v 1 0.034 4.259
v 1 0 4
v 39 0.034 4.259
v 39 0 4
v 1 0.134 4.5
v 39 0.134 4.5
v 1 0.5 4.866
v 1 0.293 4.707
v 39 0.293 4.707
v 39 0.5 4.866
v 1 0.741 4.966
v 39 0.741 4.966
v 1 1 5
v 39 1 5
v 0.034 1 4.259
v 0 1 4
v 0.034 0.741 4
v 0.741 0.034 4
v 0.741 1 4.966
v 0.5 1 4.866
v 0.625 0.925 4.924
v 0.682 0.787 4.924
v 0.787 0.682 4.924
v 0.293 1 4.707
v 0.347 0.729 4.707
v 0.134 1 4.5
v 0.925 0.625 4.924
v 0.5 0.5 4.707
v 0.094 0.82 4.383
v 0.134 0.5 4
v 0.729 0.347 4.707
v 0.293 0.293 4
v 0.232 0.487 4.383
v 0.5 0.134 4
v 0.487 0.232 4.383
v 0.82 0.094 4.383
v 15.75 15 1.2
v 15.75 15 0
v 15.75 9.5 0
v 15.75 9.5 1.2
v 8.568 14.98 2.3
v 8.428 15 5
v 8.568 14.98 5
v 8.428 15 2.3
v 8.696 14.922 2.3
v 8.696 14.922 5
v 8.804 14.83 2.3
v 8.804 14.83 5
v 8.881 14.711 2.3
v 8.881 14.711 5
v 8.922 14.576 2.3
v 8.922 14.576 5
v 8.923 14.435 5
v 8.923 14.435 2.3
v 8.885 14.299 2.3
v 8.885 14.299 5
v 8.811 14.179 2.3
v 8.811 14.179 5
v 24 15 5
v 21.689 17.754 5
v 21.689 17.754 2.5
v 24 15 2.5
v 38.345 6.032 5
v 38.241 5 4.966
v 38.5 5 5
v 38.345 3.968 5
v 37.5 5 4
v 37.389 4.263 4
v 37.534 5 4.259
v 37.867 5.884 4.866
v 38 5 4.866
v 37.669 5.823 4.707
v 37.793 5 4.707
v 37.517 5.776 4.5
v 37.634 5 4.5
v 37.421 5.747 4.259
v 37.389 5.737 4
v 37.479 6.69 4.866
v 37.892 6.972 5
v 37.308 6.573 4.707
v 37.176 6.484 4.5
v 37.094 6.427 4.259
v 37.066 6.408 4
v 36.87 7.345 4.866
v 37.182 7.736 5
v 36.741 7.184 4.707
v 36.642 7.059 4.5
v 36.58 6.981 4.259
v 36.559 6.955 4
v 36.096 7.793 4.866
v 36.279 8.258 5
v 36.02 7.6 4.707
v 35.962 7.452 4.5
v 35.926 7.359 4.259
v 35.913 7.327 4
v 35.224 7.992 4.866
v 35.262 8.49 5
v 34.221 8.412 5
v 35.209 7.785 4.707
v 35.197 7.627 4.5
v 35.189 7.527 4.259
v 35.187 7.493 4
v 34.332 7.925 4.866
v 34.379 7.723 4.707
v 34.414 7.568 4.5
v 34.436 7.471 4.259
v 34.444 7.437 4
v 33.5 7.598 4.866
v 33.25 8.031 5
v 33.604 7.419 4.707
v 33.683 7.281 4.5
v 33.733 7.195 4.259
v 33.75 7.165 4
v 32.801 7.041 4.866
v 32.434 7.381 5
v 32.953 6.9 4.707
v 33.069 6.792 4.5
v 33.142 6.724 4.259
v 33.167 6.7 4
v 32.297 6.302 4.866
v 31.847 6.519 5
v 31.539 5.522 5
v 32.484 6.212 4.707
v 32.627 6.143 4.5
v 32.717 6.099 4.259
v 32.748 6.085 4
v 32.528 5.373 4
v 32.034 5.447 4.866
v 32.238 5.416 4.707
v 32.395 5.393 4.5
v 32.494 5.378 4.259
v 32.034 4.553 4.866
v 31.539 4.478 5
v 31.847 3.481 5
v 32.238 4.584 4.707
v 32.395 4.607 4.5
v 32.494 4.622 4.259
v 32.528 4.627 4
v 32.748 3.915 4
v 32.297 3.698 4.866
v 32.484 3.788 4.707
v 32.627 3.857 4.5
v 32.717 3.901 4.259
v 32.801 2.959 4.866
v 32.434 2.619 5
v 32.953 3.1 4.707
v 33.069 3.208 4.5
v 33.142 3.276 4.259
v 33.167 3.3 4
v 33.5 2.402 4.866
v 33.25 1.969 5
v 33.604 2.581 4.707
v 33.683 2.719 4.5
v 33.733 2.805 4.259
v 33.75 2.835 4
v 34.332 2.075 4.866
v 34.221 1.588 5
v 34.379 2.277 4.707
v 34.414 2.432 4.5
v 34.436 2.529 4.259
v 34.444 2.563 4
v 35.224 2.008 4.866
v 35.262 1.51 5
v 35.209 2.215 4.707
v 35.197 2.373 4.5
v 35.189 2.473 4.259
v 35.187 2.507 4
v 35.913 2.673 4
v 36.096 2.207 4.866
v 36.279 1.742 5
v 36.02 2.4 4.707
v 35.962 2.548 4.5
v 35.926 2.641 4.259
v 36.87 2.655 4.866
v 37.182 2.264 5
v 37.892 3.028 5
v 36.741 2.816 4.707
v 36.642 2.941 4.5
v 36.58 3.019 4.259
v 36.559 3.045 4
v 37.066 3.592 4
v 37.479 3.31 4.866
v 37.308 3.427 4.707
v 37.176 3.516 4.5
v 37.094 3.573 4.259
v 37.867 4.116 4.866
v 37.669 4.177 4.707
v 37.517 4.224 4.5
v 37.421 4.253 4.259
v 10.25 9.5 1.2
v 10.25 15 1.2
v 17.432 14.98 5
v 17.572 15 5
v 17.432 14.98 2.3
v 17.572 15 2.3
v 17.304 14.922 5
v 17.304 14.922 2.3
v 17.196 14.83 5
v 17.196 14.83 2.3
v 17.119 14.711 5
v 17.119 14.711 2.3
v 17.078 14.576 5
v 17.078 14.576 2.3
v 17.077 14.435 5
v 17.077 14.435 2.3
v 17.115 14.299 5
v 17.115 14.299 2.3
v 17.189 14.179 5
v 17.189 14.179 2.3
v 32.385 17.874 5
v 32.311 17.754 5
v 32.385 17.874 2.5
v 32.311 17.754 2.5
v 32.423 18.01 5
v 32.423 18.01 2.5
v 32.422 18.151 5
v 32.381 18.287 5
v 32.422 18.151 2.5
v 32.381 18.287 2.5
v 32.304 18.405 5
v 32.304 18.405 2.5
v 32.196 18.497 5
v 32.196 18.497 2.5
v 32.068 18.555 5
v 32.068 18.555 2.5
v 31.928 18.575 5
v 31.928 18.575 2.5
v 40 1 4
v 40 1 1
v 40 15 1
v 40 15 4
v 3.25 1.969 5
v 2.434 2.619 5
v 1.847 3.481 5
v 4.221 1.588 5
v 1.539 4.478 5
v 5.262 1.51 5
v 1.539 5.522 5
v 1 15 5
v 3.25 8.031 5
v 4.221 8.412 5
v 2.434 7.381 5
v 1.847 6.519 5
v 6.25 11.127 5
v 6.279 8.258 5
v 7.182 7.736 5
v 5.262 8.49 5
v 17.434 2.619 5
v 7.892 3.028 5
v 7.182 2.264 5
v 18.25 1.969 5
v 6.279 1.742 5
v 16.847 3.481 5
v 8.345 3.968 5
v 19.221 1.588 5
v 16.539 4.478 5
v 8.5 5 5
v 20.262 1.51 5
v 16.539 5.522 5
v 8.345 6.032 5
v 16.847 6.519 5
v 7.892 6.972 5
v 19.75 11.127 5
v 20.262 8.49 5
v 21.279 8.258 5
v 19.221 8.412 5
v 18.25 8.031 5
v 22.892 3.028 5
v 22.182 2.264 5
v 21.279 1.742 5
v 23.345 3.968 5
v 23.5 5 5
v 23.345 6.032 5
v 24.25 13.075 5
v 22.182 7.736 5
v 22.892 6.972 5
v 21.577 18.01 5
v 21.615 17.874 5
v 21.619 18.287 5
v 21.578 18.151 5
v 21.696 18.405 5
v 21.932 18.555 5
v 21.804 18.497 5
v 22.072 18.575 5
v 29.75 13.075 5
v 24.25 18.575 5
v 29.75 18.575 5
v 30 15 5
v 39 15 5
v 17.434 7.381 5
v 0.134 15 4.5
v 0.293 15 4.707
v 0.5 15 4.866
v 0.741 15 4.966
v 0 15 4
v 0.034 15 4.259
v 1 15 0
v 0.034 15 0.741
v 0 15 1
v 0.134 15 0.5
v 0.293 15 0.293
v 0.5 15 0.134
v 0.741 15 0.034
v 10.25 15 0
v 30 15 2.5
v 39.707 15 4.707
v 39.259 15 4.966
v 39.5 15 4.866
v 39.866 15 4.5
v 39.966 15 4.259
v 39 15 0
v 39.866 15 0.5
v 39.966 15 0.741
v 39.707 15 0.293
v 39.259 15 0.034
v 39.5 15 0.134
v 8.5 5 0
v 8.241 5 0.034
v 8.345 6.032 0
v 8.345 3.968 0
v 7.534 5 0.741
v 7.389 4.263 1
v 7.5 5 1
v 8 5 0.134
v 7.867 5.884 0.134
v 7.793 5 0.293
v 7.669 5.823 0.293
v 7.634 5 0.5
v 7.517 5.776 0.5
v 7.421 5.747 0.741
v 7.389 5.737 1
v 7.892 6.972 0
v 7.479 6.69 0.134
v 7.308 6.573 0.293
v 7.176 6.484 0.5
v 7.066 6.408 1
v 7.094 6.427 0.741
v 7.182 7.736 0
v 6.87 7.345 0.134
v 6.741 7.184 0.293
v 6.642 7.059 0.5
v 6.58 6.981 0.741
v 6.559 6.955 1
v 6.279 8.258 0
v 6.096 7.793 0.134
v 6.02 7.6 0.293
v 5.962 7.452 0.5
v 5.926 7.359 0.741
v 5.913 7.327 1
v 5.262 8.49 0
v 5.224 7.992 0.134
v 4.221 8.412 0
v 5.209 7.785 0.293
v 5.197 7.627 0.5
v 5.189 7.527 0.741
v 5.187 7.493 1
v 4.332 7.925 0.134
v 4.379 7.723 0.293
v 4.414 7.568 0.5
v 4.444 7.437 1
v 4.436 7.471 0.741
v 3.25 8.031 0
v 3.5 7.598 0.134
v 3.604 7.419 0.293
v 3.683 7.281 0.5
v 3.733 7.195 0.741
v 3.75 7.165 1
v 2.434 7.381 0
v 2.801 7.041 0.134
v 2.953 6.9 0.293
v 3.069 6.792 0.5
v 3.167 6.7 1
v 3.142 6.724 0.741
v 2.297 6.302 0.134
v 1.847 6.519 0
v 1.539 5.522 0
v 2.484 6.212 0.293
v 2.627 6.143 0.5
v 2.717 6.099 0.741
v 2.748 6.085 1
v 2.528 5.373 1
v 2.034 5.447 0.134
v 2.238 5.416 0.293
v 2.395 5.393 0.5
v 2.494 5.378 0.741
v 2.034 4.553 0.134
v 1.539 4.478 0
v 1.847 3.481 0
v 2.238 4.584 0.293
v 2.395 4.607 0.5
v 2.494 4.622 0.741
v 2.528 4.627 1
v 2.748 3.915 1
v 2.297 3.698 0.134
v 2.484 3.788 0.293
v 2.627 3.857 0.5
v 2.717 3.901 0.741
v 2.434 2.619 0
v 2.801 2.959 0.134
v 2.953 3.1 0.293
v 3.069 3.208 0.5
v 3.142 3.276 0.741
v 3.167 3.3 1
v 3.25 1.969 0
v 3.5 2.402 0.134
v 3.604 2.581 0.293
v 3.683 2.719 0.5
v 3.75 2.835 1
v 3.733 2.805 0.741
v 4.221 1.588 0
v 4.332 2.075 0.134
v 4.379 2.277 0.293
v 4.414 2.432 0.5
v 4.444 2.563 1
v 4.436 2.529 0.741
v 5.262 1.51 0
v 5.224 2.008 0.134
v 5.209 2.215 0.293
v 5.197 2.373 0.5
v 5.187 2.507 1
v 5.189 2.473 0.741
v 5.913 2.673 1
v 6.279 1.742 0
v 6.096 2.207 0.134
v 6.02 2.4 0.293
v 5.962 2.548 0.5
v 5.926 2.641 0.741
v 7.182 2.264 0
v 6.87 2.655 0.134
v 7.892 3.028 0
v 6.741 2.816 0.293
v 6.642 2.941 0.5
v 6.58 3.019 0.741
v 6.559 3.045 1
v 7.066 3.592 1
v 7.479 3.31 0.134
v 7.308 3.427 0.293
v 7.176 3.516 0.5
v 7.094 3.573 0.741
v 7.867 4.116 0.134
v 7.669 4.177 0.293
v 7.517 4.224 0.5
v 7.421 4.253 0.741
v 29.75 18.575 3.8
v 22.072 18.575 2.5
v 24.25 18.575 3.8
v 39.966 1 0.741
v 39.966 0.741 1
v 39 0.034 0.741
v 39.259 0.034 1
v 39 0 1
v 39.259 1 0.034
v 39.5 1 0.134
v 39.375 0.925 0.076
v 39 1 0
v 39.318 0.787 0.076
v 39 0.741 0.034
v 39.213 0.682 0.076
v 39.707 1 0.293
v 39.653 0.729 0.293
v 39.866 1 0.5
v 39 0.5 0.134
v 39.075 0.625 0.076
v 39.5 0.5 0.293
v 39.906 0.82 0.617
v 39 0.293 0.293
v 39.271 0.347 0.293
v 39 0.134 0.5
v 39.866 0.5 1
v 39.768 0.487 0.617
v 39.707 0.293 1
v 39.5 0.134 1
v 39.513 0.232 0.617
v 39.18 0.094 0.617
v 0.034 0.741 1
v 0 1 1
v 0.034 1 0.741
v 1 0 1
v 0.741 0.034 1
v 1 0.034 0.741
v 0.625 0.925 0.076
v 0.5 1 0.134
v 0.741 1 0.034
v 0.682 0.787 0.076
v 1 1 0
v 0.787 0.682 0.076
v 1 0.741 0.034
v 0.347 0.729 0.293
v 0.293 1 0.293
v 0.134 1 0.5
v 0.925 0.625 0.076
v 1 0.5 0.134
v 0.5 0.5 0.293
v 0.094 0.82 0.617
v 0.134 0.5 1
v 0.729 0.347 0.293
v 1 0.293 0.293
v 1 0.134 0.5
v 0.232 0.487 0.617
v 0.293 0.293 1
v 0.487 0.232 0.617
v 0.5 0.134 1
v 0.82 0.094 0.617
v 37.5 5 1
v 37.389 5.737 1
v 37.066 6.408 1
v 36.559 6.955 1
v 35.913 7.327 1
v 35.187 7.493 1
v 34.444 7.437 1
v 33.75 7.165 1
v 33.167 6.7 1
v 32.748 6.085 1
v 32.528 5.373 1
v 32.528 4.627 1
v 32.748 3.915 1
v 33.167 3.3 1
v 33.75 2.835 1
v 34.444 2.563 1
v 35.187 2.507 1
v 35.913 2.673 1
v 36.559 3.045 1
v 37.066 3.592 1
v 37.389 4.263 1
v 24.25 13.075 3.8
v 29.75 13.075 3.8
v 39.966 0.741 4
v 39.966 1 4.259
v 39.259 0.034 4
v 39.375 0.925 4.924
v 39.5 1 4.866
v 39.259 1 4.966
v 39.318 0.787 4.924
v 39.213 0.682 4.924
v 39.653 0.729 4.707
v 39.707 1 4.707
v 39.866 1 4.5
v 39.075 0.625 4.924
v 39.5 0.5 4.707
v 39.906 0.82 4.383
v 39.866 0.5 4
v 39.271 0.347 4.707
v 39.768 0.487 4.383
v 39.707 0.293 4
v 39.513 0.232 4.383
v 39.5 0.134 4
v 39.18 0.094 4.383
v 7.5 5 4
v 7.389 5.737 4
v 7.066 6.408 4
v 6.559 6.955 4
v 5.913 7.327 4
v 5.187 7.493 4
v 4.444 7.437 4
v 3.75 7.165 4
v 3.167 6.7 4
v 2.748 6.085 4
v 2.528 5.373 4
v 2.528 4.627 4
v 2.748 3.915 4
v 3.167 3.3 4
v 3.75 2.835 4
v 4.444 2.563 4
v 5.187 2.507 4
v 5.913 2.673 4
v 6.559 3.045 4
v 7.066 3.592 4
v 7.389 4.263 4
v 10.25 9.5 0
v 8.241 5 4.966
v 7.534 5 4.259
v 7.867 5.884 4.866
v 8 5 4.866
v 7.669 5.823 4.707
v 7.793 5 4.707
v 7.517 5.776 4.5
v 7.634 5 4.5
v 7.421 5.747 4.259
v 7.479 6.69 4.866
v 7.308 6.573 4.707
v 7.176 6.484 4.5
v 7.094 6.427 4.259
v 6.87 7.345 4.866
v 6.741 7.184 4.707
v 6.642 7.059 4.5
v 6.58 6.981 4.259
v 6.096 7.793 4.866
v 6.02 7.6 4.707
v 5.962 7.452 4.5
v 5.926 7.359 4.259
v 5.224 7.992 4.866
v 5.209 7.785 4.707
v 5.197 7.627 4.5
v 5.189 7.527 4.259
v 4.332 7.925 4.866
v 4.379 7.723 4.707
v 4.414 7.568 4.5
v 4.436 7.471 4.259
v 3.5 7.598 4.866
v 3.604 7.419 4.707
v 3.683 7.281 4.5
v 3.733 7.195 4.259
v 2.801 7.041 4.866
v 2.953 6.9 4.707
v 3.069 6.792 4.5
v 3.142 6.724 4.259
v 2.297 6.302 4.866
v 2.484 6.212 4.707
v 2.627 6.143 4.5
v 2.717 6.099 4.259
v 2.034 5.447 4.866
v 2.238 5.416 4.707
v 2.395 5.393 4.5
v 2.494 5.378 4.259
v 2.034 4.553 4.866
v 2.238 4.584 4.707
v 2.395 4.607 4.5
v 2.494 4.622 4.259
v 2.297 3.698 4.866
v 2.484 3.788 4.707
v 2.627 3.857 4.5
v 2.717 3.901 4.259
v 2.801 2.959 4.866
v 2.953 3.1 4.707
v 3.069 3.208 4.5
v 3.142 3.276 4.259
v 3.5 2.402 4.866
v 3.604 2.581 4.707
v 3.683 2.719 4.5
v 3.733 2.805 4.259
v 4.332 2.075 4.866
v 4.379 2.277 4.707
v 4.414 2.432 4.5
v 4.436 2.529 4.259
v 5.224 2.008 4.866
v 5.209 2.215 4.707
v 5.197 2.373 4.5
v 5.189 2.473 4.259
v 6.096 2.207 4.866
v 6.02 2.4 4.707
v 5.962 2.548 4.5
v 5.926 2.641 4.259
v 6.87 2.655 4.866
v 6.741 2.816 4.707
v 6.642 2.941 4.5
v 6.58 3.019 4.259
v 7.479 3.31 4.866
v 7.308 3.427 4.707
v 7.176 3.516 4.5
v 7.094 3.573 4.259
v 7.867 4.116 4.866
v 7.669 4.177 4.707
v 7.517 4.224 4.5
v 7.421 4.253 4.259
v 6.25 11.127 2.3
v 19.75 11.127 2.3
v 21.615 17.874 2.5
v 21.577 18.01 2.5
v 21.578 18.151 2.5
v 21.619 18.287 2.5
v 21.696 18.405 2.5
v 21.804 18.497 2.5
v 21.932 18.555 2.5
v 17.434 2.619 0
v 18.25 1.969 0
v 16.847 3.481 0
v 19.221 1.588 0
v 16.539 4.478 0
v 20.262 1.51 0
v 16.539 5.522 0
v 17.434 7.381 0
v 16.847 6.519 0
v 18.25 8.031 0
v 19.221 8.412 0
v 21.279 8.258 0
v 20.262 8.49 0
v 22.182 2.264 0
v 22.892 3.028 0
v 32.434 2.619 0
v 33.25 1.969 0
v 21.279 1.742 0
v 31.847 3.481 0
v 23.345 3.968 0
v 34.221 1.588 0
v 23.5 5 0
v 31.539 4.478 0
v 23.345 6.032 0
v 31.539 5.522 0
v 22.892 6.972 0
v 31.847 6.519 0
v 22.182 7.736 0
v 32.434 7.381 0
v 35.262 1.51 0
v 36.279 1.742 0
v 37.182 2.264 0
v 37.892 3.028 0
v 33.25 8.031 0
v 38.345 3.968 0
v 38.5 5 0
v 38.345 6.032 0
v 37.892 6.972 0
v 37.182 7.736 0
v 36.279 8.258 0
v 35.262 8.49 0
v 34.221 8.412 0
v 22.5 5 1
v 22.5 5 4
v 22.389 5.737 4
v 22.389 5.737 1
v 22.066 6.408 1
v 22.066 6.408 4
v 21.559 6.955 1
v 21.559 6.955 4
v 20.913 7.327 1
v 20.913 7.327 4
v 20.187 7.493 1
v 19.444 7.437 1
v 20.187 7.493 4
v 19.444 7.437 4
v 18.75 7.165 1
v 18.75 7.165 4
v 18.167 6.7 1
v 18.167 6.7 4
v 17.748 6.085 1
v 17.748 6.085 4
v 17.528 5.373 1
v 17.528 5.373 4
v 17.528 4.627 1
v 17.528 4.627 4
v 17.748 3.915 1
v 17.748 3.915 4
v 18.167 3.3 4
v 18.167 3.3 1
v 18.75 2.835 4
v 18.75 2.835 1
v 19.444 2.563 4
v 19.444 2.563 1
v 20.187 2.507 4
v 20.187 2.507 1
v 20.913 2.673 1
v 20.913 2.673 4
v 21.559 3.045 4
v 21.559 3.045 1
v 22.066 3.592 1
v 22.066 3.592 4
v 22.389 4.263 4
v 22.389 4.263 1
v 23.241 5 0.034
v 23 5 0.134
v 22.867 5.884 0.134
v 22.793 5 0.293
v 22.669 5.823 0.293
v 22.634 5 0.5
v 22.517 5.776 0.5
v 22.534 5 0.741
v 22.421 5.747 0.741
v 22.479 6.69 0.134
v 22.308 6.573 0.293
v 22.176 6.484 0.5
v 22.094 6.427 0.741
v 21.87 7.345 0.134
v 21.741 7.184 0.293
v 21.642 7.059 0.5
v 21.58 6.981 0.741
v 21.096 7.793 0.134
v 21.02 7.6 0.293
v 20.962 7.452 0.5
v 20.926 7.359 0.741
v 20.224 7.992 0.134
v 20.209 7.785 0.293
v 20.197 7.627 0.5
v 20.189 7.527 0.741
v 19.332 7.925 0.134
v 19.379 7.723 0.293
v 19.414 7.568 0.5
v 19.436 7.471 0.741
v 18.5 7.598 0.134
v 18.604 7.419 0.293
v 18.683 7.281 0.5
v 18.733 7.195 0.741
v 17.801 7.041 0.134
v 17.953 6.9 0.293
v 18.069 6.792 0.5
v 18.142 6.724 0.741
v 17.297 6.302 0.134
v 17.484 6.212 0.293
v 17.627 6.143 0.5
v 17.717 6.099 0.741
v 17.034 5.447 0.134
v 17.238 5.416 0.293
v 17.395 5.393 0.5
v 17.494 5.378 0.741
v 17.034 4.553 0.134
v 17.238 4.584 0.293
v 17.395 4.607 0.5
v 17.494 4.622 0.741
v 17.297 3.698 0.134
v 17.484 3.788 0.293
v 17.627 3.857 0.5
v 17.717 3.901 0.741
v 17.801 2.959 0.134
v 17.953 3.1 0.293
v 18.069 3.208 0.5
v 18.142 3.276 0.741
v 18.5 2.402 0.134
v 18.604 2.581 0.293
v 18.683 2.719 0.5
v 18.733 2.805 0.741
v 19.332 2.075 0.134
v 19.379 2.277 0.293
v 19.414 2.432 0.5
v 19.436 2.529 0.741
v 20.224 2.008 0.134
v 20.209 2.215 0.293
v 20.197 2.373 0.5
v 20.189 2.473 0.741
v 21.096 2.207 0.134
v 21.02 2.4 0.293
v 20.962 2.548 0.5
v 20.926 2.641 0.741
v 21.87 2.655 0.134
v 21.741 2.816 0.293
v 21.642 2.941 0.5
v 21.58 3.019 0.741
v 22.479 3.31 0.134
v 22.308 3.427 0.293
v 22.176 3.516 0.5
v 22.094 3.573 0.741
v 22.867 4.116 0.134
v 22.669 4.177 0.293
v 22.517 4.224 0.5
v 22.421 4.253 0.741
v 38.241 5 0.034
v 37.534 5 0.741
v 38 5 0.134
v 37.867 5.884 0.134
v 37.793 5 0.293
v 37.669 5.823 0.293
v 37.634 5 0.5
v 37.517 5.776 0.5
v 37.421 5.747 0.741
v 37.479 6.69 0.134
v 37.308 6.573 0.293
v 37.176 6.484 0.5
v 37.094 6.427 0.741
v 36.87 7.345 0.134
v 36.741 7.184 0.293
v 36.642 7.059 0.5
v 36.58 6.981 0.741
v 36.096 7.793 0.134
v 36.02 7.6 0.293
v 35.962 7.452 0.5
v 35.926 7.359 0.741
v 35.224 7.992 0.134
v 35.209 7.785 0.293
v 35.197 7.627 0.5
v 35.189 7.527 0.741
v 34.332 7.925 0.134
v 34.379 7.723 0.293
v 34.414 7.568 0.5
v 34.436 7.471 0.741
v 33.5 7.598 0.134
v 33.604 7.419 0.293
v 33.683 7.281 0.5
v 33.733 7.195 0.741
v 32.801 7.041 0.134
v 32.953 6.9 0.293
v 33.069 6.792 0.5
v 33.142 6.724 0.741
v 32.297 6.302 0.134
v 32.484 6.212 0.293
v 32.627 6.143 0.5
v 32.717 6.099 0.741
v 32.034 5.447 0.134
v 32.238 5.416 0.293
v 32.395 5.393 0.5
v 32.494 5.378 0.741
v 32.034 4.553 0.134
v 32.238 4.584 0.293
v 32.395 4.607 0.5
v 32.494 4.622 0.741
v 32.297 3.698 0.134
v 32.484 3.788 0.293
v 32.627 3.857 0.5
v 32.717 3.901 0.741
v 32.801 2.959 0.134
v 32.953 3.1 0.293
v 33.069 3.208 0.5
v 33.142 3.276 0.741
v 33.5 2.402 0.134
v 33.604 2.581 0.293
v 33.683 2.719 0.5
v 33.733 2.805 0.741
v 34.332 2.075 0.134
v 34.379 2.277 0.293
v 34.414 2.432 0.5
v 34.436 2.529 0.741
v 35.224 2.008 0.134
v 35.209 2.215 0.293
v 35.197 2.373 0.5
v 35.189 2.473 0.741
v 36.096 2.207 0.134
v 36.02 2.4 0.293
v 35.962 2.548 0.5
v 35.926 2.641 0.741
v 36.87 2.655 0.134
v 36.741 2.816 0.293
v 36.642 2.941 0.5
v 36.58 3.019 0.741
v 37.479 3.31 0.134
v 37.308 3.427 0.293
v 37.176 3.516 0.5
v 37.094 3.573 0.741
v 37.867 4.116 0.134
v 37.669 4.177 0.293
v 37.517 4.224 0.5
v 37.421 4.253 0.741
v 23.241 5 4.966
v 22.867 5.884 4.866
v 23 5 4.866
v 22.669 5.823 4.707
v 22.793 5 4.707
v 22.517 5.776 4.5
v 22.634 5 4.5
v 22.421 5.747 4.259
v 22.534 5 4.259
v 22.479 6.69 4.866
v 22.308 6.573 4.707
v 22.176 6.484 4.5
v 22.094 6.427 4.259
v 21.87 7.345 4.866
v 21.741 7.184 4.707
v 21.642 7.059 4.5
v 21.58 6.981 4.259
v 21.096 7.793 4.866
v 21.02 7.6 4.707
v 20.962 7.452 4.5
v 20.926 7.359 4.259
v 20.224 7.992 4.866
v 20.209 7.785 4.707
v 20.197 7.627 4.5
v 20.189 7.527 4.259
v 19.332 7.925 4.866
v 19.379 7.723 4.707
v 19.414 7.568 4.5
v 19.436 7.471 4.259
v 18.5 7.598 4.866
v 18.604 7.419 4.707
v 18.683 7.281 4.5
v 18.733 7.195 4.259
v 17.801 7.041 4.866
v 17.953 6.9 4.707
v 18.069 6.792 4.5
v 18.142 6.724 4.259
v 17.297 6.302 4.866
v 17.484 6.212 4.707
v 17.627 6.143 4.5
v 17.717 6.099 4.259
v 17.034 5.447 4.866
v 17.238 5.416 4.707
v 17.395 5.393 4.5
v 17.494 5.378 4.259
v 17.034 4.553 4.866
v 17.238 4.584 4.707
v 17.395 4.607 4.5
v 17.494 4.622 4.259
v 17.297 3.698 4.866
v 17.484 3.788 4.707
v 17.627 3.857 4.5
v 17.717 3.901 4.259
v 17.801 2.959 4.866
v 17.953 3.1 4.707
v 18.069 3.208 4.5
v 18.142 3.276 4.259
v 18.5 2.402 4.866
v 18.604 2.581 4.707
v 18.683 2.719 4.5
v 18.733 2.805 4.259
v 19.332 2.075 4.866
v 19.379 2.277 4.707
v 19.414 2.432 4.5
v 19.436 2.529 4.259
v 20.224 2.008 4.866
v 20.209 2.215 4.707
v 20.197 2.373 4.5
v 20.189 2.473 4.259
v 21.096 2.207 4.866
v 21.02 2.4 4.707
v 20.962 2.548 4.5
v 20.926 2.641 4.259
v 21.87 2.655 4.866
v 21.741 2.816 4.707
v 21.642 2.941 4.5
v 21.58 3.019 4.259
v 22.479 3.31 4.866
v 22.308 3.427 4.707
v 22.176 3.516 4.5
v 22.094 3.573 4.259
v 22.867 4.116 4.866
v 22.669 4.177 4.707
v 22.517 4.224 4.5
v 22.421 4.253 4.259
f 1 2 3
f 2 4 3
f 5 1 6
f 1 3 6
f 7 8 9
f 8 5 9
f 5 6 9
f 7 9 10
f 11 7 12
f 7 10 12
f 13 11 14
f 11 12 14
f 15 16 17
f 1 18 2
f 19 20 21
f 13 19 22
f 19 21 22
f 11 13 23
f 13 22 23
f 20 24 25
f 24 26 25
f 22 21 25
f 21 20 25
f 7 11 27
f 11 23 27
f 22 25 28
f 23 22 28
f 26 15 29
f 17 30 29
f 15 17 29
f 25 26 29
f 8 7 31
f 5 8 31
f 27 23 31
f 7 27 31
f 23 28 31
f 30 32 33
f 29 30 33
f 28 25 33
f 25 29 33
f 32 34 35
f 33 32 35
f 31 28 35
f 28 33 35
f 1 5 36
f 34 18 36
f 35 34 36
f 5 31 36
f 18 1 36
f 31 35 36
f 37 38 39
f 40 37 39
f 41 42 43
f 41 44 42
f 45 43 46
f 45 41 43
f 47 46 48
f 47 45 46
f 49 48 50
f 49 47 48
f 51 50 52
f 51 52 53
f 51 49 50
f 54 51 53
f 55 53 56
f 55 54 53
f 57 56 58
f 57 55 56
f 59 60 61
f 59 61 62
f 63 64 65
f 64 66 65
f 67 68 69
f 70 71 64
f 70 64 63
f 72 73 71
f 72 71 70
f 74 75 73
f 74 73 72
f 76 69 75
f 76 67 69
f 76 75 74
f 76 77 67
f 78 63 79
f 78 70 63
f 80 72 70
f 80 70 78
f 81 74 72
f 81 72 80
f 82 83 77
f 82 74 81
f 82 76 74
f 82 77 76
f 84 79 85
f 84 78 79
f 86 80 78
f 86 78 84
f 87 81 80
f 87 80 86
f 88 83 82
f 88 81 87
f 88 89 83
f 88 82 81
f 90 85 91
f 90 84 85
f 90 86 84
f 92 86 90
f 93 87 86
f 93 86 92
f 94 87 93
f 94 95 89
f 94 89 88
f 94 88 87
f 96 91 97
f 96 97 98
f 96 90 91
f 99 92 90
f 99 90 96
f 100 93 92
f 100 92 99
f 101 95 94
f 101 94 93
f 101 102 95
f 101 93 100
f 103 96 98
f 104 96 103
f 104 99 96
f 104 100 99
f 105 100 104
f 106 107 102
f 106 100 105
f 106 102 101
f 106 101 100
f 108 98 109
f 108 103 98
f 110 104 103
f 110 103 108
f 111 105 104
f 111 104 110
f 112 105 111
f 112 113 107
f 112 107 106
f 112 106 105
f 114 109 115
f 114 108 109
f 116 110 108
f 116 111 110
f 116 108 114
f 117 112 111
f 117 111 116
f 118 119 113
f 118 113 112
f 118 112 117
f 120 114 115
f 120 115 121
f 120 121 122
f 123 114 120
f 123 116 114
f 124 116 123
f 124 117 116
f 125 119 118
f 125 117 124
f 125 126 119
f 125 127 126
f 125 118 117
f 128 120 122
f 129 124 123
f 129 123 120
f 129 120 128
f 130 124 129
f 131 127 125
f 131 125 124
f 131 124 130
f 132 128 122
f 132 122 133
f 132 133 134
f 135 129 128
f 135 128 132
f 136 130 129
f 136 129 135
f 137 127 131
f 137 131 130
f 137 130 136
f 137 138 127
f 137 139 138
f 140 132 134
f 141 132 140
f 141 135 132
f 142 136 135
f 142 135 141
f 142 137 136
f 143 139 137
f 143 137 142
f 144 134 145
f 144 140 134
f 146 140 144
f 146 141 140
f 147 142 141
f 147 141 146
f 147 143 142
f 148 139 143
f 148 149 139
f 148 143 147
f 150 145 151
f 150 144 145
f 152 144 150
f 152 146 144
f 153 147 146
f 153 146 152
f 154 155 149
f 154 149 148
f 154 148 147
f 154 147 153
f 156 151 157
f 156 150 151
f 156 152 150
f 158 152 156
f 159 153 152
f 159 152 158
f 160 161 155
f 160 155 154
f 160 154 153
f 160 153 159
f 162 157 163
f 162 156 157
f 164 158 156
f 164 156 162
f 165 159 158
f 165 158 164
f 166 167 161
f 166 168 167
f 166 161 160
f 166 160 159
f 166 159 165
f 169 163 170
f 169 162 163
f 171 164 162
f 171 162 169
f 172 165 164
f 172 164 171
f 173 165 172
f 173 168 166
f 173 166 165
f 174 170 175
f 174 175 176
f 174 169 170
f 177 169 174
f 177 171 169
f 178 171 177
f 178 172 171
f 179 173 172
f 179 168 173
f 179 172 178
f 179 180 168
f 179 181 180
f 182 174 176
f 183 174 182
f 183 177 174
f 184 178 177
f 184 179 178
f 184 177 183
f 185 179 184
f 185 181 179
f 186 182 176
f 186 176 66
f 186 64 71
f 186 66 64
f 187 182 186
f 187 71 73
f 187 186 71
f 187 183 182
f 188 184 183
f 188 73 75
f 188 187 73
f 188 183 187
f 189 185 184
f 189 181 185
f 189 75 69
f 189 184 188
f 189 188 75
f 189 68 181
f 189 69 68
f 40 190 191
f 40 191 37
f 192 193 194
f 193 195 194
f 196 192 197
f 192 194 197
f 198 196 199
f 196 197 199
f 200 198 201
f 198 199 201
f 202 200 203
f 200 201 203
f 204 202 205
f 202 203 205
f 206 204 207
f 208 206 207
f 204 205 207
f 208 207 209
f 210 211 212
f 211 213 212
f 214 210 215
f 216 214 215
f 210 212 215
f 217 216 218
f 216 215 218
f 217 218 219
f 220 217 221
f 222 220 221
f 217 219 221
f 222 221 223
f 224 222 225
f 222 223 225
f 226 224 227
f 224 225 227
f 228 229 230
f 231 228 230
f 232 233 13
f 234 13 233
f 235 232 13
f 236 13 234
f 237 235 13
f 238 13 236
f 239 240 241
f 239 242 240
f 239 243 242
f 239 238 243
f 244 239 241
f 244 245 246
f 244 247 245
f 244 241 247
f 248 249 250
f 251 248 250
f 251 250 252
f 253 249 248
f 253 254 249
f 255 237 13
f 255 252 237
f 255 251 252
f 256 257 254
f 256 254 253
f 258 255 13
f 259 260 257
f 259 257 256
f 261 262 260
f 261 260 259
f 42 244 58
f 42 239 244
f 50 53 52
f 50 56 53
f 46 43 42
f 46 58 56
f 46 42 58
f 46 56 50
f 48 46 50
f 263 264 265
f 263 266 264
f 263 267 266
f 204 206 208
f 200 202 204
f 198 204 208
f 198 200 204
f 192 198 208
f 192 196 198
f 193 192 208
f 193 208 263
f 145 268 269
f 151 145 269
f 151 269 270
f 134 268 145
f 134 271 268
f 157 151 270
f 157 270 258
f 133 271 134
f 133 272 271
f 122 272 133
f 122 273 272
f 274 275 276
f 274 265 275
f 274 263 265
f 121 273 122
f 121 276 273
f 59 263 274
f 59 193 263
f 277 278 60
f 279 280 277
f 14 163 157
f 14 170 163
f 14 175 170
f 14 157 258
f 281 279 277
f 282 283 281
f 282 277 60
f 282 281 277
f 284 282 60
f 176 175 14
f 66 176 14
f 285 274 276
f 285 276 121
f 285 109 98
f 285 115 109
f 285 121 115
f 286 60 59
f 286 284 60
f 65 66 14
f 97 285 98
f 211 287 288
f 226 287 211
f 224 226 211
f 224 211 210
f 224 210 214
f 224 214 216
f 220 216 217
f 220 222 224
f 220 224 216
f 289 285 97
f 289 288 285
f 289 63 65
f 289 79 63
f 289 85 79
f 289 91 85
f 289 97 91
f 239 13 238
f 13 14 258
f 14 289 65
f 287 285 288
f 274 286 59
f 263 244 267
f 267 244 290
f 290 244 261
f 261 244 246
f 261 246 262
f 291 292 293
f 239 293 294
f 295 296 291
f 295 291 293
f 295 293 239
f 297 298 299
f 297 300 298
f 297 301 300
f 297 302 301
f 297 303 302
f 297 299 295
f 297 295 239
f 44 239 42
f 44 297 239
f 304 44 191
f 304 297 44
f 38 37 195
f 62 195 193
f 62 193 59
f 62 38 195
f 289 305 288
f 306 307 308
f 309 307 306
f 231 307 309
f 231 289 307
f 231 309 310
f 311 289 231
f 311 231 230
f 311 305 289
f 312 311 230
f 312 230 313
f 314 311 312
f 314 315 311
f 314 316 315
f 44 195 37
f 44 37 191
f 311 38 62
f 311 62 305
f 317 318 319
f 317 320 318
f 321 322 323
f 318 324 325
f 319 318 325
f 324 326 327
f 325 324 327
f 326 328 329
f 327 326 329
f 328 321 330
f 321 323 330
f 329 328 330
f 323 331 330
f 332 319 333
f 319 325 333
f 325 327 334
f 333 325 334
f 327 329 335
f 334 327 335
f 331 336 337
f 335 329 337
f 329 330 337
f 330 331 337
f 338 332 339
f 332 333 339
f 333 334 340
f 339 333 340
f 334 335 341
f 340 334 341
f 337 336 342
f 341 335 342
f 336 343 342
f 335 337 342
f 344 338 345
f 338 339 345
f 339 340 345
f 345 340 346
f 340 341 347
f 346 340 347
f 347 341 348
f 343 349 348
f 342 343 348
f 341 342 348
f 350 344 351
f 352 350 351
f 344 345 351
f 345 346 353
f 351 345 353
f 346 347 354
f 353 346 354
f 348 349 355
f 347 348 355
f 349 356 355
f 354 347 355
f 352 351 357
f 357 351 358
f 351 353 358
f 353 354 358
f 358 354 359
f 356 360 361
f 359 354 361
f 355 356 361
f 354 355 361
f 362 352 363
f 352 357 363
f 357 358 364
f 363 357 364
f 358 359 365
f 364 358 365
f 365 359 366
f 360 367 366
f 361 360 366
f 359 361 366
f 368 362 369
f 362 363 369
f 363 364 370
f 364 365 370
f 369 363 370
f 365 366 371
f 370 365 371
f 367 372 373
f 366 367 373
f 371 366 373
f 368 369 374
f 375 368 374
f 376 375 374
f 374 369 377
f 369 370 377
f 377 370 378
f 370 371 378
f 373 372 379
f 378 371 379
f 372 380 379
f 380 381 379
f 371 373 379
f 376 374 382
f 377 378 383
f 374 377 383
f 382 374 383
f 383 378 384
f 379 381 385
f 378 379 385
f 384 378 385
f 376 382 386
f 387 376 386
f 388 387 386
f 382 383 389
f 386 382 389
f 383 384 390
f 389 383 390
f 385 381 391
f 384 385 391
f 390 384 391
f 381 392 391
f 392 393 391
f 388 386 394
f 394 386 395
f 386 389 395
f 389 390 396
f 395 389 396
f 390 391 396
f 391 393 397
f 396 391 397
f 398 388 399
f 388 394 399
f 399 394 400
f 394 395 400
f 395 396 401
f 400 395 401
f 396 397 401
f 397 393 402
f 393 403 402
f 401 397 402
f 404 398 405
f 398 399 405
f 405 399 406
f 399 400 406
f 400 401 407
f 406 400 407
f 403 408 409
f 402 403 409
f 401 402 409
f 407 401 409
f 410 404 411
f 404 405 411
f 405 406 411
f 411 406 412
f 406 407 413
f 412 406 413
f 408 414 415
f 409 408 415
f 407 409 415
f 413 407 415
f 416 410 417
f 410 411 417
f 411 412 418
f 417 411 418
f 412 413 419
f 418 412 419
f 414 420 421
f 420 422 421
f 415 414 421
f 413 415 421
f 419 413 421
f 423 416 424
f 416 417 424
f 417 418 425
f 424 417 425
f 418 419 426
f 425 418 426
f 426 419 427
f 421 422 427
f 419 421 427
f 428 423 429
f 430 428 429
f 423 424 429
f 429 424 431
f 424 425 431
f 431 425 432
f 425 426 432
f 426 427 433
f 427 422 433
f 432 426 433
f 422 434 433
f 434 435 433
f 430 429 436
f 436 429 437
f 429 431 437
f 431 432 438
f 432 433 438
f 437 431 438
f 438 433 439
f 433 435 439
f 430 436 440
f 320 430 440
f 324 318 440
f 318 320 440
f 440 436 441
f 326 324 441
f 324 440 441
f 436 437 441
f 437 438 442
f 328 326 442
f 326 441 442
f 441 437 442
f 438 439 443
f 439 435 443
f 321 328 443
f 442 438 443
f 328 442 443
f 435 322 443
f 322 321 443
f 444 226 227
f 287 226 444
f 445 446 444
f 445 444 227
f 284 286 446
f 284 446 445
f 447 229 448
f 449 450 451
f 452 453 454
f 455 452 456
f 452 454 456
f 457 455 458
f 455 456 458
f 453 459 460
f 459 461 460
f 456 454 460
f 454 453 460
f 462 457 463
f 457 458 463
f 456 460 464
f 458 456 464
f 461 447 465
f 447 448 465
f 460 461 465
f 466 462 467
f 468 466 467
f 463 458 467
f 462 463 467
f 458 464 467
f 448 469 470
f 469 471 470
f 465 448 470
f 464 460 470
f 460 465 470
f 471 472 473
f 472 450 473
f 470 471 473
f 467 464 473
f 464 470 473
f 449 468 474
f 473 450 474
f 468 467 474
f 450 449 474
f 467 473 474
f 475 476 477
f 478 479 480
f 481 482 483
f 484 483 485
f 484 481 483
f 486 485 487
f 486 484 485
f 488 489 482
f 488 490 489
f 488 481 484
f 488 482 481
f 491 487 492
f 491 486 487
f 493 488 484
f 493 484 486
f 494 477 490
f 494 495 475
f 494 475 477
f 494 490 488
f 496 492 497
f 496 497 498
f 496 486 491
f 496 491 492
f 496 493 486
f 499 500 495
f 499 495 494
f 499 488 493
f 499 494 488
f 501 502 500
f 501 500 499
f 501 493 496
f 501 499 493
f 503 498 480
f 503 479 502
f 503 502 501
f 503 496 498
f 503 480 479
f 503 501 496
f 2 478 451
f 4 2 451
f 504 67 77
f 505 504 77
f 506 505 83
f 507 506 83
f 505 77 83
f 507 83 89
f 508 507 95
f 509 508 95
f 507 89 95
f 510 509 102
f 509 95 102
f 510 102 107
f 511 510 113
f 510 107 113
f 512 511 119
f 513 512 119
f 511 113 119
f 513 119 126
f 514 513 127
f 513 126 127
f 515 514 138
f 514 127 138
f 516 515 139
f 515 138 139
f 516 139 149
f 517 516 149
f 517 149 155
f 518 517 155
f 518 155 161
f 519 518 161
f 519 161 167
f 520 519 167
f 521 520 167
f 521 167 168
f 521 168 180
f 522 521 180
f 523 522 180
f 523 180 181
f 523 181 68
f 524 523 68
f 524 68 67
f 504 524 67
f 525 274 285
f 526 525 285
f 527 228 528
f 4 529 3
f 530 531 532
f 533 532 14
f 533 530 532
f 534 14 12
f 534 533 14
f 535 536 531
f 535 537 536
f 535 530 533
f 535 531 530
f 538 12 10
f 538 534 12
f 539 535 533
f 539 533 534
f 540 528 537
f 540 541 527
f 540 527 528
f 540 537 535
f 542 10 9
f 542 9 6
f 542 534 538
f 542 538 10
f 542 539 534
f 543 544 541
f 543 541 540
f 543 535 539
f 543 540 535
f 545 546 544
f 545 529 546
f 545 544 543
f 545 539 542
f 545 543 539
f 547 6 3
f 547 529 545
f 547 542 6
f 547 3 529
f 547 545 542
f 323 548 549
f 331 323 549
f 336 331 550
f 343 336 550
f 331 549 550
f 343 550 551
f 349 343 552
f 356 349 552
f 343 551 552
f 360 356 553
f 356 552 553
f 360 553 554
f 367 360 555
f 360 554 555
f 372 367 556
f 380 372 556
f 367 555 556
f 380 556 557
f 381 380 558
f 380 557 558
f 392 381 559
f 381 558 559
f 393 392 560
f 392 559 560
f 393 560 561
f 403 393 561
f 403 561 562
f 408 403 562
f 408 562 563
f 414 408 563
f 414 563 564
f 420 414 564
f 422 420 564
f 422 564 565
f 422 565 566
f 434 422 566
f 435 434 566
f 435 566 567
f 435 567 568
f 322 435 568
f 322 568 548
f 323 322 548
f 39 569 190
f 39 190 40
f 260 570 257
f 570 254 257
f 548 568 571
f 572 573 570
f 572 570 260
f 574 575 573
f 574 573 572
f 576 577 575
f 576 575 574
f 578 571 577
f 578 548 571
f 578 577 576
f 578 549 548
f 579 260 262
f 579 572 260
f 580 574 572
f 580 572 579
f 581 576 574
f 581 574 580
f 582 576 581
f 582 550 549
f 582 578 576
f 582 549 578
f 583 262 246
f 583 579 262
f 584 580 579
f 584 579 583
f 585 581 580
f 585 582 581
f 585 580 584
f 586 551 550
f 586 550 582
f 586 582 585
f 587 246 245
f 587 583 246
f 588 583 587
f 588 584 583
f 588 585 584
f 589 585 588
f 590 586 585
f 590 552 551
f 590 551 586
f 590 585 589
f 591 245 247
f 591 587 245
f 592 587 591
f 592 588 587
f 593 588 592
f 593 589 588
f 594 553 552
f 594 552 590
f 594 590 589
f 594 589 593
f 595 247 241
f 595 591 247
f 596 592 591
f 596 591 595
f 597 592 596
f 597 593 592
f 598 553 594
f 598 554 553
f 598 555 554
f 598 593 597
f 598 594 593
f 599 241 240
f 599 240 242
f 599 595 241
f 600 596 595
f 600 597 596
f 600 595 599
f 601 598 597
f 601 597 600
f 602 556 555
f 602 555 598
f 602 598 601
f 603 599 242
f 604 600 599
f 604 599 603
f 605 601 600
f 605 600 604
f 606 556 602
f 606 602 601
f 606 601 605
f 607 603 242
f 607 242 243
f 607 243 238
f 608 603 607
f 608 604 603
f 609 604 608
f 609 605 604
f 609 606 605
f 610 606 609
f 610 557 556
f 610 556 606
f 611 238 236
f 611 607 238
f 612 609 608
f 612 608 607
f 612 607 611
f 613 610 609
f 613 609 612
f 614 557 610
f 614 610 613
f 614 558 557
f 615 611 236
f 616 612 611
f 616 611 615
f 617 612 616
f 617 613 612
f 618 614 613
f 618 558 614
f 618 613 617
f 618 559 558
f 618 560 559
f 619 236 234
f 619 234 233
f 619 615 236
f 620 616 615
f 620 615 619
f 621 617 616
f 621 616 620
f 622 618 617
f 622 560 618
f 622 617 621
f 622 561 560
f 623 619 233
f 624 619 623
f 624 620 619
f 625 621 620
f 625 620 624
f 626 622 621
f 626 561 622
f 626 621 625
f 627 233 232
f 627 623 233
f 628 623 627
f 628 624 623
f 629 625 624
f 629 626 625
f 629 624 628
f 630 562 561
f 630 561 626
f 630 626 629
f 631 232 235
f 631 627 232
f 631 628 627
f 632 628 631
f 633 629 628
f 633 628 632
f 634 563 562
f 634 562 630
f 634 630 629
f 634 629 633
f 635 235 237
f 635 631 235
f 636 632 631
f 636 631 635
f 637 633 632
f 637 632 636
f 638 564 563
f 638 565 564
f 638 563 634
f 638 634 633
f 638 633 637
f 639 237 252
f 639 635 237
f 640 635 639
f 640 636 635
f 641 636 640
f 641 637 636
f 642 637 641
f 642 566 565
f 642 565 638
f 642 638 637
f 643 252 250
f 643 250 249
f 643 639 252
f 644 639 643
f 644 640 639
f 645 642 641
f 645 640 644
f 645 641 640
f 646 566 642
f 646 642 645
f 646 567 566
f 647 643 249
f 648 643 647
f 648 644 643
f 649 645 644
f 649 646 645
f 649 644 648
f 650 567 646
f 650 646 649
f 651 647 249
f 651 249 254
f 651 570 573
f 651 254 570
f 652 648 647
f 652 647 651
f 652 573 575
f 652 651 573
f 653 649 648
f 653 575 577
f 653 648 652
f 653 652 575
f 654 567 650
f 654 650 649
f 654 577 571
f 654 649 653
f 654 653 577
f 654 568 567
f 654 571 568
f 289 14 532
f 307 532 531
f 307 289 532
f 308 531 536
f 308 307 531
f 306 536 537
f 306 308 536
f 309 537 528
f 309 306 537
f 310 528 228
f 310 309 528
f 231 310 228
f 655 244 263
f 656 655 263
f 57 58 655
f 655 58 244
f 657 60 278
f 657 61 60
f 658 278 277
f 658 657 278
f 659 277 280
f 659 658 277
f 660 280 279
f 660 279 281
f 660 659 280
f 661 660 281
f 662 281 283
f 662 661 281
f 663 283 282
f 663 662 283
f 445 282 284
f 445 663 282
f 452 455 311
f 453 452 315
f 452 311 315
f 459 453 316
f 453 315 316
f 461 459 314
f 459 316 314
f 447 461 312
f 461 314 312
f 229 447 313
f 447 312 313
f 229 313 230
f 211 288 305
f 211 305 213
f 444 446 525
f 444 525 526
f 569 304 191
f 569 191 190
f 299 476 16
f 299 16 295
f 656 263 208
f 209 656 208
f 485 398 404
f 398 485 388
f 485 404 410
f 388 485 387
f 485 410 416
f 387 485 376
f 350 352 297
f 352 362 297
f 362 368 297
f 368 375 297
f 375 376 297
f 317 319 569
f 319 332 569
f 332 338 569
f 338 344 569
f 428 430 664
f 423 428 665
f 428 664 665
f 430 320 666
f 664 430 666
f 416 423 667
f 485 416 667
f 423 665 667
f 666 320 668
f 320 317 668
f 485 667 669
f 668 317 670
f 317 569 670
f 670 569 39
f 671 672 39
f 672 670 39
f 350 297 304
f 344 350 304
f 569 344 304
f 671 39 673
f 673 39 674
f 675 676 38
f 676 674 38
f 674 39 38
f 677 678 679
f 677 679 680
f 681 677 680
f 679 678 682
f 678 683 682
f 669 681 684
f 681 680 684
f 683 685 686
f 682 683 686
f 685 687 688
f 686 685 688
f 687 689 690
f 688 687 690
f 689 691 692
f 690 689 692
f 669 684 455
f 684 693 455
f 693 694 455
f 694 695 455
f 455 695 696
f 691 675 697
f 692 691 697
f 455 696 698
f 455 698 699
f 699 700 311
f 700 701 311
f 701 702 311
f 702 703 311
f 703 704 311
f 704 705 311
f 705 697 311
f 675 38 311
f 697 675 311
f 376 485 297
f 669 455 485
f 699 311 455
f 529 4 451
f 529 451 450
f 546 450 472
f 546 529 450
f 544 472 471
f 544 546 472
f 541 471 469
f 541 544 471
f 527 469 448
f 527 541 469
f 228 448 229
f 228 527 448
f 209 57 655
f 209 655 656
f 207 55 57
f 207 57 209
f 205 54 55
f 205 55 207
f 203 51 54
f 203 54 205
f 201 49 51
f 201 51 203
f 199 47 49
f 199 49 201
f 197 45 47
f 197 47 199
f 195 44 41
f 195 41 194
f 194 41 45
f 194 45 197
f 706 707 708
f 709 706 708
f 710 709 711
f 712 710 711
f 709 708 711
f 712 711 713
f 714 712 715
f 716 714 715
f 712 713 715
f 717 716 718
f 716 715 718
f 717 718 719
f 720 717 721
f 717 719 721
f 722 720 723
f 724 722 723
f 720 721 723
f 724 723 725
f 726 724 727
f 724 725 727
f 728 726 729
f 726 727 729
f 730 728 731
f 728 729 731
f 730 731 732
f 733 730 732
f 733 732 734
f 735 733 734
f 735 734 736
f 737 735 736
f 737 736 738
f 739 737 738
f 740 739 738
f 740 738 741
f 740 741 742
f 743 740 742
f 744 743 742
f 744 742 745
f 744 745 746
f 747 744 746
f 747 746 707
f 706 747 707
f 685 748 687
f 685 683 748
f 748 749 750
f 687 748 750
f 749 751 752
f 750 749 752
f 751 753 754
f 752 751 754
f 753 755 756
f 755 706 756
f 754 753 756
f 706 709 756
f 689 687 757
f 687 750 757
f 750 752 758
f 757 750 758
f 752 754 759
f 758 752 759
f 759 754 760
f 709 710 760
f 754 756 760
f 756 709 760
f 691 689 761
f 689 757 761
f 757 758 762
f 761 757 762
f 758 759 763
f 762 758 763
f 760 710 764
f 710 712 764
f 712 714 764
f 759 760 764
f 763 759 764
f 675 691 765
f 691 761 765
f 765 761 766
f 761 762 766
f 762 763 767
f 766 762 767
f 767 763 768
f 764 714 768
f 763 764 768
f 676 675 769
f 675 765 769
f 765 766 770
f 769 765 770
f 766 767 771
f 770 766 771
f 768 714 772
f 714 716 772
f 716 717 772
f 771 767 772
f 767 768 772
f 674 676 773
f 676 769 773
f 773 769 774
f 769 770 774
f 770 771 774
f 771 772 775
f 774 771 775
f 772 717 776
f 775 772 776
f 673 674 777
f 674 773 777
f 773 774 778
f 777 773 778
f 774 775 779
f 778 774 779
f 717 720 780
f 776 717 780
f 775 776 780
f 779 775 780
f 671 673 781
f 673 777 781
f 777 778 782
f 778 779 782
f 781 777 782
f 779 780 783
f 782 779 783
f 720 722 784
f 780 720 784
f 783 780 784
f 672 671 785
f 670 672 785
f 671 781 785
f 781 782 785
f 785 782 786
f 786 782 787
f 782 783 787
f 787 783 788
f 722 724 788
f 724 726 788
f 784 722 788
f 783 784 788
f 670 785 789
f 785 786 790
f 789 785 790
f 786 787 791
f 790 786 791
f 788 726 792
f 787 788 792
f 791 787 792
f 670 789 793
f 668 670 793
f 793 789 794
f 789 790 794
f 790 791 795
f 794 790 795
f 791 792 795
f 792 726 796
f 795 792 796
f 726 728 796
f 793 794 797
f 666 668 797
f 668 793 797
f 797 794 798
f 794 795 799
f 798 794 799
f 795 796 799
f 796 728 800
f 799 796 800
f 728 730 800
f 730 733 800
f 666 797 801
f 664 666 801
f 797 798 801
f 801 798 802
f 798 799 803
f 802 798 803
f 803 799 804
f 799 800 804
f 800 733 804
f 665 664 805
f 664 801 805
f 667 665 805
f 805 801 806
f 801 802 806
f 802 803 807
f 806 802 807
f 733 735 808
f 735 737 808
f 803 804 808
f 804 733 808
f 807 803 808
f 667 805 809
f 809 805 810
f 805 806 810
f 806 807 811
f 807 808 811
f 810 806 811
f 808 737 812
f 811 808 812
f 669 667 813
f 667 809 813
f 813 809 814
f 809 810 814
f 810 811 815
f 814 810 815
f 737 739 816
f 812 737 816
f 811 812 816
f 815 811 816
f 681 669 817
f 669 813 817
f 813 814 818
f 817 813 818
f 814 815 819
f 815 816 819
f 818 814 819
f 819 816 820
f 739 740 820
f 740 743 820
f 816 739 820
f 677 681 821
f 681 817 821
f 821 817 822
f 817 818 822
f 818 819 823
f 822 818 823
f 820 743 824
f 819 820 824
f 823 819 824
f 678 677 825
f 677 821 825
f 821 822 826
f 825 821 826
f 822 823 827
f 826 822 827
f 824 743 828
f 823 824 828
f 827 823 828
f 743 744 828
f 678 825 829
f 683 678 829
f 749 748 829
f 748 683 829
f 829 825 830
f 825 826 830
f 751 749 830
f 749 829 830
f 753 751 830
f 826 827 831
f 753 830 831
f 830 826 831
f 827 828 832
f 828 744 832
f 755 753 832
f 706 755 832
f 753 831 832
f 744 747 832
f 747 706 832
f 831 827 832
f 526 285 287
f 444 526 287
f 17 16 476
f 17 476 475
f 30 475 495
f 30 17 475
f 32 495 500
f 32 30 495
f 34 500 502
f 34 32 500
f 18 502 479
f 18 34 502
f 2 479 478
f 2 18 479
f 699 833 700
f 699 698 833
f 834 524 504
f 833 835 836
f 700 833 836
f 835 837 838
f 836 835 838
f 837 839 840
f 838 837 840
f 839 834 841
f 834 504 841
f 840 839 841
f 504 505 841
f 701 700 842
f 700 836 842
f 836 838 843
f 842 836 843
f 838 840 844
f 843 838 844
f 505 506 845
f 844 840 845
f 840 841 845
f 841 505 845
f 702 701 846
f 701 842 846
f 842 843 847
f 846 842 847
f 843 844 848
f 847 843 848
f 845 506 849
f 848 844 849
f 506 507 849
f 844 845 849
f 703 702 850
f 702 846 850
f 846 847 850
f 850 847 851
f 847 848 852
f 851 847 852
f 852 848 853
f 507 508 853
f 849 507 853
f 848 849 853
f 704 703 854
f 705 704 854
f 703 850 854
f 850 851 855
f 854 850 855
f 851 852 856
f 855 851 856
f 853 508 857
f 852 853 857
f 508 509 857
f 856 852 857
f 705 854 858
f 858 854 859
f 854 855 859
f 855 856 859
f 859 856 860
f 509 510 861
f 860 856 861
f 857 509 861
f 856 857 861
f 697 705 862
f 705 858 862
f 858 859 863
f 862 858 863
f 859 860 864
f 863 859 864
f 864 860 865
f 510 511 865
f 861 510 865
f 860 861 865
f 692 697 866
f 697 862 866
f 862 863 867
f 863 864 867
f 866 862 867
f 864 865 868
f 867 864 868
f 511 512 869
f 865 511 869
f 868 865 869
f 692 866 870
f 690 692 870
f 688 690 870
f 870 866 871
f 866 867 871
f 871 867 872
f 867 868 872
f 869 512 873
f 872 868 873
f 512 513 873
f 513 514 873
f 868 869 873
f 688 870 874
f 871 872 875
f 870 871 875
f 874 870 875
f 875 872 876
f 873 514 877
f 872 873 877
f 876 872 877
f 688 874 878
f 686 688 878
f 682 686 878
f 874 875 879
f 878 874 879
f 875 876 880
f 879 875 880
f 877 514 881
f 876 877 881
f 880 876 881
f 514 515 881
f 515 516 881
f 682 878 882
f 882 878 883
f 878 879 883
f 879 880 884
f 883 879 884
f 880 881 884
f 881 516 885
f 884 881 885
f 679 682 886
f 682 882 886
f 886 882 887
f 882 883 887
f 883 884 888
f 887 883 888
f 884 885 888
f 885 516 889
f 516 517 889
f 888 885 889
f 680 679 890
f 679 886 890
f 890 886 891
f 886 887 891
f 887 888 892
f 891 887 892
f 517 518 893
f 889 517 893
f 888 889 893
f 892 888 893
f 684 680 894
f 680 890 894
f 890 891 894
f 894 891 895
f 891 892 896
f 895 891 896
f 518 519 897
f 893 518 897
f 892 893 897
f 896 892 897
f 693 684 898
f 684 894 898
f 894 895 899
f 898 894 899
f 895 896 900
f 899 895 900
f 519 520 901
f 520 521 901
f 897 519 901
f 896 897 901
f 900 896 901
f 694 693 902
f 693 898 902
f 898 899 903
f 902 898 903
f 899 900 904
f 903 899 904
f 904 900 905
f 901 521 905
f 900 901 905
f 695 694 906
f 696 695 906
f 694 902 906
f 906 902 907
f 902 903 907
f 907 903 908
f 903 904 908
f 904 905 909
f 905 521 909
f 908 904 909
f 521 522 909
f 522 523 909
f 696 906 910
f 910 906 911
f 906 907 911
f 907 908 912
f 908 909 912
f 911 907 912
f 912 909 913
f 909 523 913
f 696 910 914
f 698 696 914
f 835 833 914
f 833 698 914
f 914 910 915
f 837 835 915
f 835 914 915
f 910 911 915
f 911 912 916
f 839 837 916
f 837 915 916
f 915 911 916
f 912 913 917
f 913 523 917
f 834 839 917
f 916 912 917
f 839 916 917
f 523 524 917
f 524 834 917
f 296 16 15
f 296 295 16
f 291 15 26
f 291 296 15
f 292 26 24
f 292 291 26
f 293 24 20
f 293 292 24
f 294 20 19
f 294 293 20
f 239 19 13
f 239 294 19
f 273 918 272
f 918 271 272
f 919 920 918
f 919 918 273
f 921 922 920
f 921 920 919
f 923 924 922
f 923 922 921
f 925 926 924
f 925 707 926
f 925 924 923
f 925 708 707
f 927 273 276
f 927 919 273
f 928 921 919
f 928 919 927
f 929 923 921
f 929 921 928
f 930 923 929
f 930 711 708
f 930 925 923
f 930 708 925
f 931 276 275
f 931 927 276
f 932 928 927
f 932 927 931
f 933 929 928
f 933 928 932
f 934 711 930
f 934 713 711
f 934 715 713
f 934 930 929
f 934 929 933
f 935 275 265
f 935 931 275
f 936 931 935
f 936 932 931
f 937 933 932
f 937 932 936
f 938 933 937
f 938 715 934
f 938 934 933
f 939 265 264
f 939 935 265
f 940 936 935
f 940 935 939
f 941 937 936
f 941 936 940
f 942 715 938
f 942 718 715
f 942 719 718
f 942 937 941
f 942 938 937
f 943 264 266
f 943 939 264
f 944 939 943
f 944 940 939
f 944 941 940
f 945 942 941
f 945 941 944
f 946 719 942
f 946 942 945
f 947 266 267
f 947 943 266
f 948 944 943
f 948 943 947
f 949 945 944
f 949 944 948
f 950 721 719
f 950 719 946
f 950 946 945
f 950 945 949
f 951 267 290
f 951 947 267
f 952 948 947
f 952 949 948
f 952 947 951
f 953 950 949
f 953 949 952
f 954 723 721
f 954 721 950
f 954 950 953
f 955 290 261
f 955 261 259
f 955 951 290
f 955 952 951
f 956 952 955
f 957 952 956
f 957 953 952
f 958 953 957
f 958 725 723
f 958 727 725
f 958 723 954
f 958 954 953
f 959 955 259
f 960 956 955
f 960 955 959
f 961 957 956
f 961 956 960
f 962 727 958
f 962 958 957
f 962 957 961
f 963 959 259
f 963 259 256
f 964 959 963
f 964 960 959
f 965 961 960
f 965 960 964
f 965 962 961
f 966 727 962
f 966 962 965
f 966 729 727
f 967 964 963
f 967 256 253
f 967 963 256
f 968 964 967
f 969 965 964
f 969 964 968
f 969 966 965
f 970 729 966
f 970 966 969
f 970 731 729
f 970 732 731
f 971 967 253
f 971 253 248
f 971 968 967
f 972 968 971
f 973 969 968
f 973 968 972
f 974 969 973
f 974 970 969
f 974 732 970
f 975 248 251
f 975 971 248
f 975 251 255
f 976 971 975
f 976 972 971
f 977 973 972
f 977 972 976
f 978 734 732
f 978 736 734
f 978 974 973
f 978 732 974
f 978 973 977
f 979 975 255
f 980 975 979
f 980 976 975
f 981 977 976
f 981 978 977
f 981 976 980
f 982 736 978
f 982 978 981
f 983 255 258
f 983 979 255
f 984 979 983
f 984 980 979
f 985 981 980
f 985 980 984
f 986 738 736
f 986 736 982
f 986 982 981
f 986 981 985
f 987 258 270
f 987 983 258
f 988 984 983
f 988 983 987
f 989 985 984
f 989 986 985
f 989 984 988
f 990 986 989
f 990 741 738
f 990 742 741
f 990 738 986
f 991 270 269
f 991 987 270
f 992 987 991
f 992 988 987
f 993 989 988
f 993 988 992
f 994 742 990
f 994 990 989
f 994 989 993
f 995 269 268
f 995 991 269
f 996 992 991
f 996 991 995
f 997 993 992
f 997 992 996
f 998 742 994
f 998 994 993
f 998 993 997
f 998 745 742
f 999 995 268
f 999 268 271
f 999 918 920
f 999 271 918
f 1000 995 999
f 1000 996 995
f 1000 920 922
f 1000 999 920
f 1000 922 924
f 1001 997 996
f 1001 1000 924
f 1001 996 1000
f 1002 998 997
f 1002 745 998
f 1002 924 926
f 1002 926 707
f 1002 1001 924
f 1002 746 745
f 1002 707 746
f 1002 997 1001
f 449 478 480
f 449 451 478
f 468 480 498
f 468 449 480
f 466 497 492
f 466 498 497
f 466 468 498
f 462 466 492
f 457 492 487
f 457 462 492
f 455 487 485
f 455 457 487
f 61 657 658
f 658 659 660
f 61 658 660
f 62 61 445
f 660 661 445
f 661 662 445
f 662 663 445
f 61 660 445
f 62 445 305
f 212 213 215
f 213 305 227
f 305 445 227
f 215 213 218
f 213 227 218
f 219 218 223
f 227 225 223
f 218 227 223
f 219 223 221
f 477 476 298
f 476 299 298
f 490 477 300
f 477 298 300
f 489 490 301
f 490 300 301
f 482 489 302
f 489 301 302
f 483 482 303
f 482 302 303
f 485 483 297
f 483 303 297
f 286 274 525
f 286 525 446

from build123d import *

# Parameters (mm, degrees)
F0_W      = 40
F0_H      = 15
F1_DEPTH  = 5
F2_R      = 2.5
F3_DEPTH  = 5.001
F5_DEPTH  = 2.5
F7_DEPTH  = 2.7
F8_R      = 1
F9_R      = 1
F10_R     = 0.5
F11_W     = 5.5
F11_H     = 5.5
F12_DEPTH = 1.2
F13_W     = 5.5
F13_H     = 5.5
F14_DEPTH = 1.2


with BuildPart() as f1:
    # F0 (on Top) → F1 (new body)
    with BuildSketch(Plane.XY):
        with Locations((20, 7.5)):
            Rectangle(F0_W, F0_H)
    extrude(amount=F1_DEPTH)

    # F2 (on face) → F3 (cut, through all)
    with BuildSketch(Plane.XY.offset(5)):
        with Locations((5, 5)):
            Circle(F2_R)
        with Locations((20, 5)):
            Circle(F2_R)
        with Locations((35, 5)):
            Circle(F2_R)
    extrude(amount=-F3_DEPTH, mode=Mode.SUBTRACT)

    # F4 (on face) → F5 (join)
    with BuildSketch(Plane.XY.offset(5)):
        Polygon((21, 18.5752607778), (24, 15), (30, 15), (33, 18.5752607778), align=None)
    extrude(amount=-F5_DEPTH)

    # F6 (on face) → F7 (cut)
    with BuildSketch(Plane.XY.offset(5)):
        Polygon((16.5, 15), (9.5, 15), (6.25, 11.1268008241), (19.75, 11.1268008241), align=None)
    extrude(amount=-F7_DEPTH, mode=Mode.SUBTRACT)

    # F8
    f8_edges = [f1.edges().sort_by_distance(p)[0] for p in [
        (0, 0, 2.5),
        (40, 0, 2.5),
        (0, 7.5, 5),
        (0, 7.5, 0),
        (40, 7.5, 5),
        (40, 7.5, 0),
        (20, 0, 5),
        (20, 0, 0),
    ]]
    fillet(f8_edges, radius=F8_R)

    # F9
    f9_edges = [f1.edges().sort_by_distance(p)[0] for p in [
        (2.5, 5, 5),
        (17.5, 5, 5),
        (32.5, 5, 5),
        (2.5, 5, 0),
        (17.5, 5, 0),
        (32.5, 5, 0),
    ]]
    fillet(f9_edges, radius=F9_R)

    # F10
    f10_edges = [f1.edges().sort_by_distance(p)[0] for p in [
        (21, 18.575261, 3.75),
        (33, 18.575261, 3.75),
        (9.5, 15, 3.65),
        (16.5, 15, 3.65),
    ]]
    fillet(f10_edges, radius=F10_R)

    # F11 (on face) → F12 (cut)
    with BuildSketch(Plane.XY.offset(5)):
        with Locations((27, 15.8252607778)):
            Rectangle(F11_W, F11_H)
    extrude(amount=-F12_DEPTH, mode=Mode.SUBTRACT)

    # F13 (on face) → F14 (cut)
    with BuildSketch(Plane(origin=(0, 0, 0), x_dir=(1, 0, 0), z_dir=(0, 0, -1))):
        with Locations((13, -12.25)):
            Rectangle(F13_W, F13_H)
    extrude(amount=-F14_DEPTH, mode=Mode.SUBTRACT)


solid = f1.part
